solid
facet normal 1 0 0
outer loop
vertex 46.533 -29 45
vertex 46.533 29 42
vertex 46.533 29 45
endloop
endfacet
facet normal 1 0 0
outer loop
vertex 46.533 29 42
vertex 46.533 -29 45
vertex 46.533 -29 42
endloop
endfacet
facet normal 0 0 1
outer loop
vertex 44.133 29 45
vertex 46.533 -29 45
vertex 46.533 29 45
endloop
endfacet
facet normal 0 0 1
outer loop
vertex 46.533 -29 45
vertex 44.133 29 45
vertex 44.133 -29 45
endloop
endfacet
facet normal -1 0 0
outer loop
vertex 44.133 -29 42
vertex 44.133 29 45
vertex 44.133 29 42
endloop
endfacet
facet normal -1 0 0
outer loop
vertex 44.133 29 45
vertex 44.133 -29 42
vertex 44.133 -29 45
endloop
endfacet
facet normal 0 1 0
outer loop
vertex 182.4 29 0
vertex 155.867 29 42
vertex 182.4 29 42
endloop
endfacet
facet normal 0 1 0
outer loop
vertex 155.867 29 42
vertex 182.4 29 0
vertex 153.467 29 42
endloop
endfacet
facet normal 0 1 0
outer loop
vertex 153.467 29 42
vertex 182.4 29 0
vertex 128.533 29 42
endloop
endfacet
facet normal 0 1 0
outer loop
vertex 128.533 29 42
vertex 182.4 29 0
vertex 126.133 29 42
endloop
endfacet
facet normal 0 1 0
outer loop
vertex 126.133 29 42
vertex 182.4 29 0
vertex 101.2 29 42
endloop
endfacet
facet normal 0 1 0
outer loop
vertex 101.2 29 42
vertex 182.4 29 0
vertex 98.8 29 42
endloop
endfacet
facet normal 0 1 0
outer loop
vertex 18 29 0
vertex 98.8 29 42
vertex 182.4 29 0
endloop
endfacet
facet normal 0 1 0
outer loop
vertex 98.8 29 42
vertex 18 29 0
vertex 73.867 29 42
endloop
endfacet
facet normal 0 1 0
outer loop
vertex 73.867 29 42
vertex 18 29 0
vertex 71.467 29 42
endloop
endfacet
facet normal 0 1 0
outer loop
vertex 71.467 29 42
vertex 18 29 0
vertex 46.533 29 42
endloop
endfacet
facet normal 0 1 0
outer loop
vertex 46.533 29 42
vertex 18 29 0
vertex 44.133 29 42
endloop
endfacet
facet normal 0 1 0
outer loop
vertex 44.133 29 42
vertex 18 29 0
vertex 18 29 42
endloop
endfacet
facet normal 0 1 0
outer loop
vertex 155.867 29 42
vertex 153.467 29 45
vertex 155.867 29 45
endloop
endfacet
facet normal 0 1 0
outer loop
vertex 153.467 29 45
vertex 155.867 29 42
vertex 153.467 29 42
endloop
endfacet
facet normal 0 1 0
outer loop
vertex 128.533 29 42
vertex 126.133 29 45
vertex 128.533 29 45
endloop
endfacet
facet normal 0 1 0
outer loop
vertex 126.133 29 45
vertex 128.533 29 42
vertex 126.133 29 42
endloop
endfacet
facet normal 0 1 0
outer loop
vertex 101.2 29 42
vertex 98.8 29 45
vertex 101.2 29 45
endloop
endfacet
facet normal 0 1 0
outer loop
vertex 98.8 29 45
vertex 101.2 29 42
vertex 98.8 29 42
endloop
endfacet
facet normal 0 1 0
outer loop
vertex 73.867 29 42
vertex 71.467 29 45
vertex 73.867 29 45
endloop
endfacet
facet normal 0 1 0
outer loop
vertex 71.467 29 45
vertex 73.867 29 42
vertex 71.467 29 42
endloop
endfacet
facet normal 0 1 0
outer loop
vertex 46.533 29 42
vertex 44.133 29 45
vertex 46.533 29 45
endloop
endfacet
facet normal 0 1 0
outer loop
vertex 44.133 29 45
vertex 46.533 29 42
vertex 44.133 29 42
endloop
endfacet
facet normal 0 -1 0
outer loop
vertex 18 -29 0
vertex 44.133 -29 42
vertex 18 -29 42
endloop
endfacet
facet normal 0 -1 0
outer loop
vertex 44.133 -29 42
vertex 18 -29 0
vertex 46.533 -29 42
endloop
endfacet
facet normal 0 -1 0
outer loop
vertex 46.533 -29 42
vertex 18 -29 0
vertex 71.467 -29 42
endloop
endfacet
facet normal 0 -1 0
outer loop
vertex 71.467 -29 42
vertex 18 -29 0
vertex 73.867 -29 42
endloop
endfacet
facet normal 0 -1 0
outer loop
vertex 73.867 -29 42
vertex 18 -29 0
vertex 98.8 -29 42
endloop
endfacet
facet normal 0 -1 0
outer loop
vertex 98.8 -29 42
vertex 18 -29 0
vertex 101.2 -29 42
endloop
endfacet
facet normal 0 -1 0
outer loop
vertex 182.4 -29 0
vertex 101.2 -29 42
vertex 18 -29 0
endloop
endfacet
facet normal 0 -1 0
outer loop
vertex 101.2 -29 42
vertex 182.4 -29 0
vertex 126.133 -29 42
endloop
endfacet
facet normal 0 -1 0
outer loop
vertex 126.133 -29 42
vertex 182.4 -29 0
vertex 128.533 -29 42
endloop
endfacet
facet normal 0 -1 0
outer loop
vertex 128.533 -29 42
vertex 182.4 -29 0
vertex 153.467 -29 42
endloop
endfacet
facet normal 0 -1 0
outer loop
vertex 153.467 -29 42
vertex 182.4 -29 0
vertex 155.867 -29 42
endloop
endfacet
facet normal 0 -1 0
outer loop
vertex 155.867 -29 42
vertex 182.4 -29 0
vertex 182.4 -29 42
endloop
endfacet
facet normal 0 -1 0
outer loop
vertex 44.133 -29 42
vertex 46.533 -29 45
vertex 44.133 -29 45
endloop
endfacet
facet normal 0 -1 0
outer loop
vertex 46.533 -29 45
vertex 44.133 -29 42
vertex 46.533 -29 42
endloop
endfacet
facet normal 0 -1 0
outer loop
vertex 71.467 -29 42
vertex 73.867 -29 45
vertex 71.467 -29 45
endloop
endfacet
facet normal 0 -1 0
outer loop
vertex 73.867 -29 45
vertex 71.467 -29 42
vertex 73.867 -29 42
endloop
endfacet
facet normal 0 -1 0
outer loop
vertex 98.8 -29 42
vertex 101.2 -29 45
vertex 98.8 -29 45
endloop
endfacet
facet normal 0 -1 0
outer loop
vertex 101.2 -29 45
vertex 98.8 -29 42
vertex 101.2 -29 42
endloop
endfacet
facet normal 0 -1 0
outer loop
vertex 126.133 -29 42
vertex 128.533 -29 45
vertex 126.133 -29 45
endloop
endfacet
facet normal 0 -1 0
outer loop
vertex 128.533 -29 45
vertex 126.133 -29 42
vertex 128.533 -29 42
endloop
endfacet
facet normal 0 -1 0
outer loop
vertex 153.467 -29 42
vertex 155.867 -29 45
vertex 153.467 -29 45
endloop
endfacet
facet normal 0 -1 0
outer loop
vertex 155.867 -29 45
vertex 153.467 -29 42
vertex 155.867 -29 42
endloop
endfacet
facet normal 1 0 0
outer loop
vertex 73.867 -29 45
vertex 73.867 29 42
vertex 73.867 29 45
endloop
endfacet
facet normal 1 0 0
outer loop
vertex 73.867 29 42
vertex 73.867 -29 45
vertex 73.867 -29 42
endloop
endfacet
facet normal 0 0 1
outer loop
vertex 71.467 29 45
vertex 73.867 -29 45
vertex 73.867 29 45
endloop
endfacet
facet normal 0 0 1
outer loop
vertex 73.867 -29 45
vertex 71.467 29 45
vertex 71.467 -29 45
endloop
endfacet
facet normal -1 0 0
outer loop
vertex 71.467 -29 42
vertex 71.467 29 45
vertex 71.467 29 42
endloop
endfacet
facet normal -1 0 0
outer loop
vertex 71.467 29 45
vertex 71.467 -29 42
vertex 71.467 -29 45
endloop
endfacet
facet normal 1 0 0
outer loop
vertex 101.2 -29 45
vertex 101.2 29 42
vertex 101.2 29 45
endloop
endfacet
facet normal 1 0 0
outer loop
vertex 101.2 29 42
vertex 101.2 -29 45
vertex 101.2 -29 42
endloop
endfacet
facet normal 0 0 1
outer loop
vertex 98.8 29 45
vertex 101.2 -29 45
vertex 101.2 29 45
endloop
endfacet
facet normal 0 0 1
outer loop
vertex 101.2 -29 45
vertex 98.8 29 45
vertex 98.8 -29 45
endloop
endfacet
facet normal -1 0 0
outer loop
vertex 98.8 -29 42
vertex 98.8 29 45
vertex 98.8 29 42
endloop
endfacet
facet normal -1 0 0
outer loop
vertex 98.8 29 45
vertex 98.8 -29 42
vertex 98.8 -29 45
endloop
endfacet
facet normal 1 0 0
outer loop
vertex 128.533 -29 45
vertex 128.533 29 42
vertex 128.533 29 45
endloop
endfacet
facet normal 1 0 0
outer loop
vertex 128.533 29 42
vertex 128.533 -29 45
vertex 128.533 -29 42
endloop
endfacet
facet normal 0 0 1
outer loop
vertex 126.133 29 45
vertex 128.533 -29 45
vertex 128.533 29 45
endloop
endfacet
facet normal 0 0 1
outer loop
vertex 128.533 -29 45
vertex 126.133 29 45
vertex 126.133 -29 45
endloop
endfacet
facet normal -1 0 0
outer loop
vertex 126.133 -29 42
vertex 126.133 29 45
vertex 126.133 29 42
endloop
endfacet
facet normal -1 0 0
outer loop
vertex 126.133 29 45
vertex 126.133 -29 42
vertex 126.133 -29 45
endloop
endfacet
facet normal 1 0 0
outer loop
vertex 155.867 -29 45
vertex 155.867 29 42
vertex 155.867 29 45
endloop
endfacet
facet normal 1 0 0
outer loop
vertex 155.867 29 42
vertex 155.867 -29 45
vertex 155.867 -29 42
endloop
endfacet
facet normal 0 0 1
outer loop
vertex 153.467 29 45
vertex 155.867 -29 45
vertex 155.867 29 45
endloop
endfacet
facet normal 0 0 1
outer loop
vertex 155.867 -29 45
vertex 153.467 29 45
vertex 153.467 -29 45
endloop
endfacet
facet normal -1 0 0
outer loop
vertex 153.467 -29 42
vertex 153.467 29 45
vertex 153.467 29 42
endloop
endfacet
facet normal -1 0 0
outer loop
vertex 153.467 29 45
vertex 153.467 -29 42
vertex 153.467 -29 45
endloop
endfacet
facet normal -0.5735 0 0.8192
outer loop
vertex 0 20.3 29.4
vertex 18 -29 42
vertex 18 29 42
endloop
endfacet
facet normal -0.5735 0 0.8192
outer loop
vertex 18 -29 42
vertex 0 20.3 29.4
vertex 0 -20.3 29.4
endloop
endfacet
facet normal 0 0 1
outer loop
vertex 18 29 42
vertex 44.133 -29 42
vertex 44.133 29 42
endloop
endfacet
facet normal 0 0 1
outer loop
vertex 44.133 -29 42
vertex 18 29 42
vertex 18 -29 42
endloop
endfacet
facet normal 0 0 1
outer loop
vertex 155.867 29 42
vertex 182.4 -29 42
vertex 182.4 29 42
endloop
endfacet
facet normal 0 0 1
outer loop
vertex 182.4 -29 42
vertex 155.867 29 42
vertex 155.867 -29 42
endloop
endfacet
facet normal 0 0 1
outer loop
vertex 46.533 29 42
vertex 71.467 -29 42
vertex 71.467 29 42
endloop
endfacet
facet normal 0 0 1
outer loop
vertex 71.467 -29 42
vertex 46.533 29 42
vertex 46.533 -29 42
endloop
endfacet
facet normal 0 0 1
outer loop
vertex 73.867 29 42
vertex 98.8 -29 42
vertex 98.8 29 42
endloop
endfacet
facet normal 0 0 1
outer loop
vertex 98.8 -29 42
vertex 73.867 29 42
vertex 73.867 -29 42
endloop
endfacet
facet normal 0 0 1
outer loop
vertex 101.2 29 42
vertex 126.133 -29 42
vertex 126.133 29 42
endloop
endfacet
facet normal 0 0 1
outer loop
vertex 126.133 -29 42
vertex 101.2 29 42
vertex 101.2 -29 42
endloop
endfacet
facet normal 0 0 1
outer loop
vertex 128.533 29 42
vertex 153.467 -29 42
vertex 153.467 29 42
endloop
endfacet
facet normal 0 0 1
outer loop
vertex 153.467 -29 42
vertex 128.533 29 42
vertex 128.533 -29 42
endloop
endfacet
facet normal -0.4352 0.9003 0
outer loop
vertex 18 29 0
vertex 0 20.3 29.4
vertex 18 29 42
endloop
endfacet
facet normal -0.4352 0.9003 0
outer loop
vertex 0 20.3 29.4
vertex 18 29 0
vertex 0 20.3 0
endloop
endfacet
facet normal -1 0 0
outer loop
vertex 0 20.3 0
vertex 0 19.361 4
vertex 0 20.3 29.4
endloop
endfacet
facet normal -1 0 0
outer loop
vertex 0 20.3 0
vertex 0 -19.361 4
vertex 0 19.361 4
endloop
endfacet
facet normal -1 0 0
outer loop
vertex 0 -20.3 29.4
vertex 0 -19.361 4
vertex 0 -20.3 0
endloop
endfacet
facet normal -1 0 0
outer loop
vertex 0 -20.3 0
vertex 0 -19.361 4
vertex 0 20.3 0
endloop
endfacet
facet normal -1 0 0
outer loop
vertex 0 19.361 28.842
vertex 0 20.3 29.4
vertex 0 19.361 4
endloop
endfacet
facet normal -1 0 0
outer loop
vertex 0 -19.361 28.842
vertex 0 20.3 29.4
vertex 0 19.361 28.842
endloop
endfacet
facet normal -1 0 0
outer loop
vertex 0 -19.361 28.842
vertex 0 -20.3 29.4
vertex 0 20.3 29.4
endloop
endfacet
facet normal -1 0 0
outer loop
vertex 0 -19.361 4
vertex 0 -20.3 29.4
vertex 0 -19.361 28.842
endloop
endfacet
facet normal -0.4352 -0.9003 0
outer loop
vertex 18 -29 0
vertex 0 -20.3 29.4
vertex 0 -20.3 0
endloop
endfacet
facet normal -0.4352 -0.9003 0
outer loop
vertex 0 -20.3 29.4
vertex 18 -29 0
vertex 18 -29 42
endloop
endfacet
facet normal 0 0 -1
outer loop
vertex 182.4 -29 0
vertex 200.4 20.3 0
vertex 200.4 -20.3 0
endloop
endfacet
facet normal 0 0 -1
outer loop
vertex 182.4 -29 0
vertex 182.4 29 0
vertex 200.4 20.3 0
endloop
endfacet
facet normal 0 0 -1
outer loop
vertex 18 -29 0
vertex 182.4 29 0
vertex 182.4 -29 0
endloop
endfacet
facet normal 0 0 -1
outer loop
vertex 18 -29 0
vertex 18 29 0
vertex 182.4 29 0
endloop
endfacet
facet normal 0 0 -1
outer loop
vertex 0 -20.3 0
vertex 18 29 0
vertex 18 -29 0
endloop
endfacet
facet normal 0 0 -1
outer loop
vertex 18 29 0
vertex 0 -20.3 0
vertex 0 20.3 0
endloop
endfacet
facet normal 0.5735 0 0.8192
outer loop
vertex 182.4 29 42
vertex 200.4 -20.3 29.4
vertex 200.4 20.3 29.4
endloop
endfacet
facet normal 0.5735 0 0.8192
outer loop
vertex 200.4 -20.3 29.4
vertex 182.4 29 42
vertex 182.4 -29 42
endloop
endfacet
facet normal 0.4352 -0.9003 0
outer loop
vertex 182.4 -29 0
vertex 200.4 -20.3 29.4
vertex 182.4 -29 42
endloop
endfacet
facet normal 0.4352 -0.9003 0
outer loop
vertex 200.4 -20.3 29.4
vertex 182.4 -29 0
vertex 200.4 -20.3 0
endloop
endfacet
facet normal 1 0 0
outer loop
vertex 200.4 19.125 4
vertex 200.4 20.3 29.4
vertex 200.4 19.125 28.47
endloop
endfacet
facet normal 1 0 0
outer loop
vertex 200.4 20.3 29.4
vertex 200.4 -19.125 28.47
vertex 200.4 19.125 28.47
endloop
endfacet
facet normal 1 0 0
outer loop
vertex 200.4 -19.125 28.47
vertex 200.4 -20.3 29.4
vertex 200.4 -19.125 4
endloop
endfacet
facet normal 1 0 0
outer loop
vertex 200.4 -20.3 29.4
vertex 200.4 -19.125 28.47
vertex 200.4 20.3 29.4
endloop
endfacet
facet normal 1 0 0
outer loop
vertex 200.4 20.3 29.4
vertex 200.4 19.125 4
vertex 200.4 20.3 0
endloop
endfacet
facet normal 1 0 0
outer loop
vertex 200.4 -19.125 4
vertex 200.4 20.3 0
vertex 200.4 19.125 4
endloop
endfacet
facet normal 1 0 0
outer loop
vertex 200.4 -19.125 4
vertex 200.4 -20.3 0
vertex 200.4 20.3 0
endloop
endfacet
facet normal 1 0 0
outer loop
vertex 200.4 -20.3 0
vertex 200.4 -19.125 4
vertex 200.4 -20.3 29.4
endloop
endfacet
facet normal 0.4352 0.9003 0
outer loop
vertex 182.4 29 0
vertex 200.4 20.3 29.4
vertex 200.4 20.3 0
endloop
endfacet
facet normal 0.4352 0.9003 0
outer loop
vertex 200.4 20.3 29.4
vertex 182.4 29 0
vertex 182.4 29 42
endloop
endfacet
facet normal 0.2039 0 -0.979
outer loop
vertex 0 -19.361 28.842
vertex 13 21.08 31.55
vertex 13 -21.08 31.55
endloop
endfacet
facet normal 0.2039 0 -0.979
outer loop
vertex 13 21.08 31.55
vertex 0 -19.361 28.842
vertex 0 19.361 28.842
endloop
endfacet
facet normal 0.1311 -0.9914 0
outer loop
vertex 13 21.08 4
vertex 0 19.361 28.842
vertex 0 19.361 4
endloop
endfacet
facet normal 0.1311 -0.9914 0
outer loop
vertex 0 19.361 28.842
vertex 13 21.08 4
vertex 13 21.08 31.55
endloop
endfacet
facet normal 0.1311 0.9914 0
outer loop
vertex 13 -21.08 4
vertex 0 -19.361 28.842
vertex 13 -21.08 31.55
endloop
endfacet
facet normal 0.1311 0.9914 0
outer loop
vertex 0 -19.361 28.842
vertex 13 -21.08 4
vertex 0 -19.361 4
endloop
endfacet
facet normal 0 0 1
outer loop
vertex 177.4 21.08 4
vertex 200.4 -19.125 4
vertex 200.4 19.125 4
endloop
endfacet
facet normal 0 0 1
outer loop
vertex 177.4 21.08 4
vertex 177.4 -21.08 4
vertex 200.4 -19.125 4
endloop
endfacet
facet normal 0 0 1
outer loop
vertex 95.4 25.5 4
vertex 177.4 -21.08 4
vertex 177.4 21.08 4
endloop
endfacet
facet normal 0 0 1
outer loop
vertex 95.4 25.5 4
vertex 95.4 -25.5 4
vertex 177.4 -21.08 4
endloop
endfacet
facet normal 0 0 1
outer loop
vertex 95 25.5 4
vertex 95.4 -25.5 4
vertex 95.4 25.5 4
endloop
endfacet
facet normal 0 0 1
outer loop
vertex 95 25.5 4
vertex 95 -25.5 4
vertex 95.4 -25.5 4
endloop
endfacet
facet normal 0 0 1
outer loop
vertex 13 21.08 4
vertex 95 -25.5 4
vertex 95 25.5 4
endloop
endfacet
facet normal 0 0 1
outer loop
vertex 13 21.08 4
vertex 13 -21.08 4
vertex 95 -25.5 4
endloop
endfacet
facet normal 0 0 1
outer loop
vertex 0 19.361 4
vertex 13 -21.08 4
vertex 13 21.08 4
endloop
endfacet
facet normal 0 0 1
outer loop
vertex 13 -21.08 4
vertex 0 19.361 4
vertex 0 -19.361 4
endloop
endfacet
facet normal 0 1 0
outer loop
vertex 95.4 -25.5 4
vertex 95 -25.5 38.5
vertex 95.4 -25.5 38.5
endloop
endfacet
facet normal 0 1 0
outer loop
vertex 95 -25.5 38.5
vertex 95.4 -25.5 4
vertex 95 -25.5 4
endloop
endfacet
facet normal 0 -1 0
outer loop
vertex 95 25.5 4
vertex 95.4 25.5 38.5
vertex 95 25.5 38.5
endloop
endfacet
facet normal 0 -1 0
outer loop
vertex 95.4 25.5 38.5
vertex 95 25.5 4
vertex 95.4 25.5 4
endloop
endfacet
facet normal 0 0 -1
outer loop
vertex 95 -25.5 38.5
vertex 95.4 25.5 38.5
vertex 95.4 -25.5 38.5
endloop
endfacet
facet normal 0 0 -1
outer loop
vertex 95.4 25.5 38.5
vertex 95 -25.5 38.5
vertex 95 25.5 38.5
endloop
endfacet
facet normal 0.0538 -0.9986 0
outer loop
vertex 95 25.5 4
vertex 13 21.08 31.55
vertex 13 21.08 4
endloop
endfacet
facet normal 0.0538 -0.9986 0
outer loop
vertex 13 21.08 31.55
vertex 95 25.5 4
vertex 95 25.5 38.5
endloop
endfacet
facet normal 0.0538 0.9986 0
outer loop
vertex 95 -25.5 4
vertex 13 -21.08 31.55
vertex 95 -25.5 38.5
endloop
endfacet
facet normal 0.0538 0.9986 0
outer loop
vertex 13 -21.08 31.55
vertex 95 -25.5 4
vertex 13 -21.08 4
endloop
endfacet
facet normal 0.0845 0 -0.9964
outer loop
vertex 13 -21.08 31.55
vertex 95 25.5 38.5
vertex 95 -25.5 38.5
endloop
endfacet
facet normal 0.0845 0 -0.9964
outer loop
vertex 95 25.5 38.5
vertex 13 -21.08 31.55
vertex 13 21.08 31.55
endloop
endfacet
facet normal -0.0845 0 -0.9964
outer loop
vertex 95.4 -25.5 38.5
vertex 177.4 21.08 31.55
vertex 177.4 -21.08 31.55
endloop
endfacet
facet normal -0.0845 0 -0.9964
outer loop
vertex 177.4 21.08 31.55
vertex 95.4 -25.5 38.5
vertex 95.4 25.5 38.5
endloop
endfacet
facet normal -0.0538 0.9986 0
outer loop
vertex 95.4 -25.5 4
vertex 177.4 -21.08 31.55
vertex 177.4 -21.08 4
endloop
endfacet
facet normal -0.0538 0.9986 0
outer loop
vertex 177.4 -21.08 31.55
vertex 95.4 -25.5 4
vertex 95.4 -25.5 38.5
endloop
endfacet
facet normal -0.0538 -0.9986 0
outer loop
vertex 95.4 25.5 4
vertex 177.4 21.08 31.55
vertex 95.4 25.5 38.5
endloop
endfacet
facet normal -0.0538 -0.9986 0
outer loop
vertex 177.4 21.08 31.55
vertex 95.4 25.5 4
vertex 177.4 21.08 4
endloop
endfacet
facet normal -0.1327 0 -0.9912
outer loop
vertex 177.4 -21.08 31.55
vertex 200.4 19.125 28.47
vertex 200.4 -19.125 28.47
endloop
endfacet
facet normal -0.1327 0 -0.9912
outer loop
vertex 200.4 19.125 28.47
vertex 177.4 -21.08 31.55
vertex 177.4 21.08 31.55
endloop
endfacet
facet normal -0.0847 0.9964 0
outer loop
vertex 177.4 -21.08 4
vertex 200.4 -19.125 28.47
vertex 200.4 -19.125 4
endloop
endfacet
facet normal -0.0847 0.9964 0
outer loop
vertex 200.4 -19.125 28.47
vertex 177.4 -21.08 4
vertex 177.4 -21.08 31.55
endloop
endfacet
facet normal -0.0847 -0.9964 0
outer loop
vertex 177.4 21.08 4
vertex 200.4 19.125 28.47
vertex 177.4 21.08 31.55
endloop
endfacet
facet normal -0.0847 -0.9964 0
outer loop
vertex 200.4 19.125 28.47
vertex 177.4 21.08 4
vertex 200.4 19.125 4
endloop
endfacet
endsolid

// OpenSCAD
$fn = 32;

// ----------------------------------------------------------------------
// Faired channel: 200 x 58 x 42 mm, 3.5 mm walls, faired ends
// ----------------------------------------------------------------------

// --- parameters (mm) ---
length = 200;             // channel length
width = 58;               // channel width at mid length
height = 42;              // channel height at mid length
wall = 3.5;               // side wall thickness
floor_t = 4;              // floor thickness
end_w = 40.6;             // faired end width
end_h = 29.4;             // faired end height
ribs = 5;                 // stiffening ribs on the top
rib_t = 2.4;              // rib thickness
rib_h = 3;                // rib height

difference() {
  union() {
    hull() {
      translate([0, -20.3, 0]) cube([0.4, 40.6, 29.4]);
      translate([18, -29, 0]) cube([0.4, 58, 42]);
    }
    hull() {
      translate([18, -29, 0]) cube([0.4, 58, 42]);
      translate([100, -29, 0]) cube([0.4, 58, 42]);
    }
    hull() {
      translate([100, -29, 0]) cube([0.4, 58, 42]);
      translate([182, -29, 0]) cube([0.4, 58, 42]);
    }
    hull() {
      translate([182, -29, 0]) cube([0.4, 58, 42]);
      translate([200, -20.3, 0]) cube([0.4, 40.6, 29.4]);
    }
    /* stiffening ribs across the flat top, sunk 0.8 mm into it */
    for (i = [1 : ribs]) {
      translate([18 + i * (length - 2 * 18) / (ribs + 1) - rib_t / 2, -width / 2, height - 0.8]) cube([rib_t, width, rib_h + 0.8]);
    }
  }
  /* cavity, 5 mm proud of both ends so the ports are cut clean */
  hull() {
    translate([-5, -18.7, 4]) cube([0.4, 37.4, 23.8]);
    translate([13, -21.08, 4]) cube([0.4, 42.16, 27.55]);
  }
  hull() {
    translate([13, -21.08, 4]) cube([0.4, 42.16, 27.55]);
    translate([95, -25.5, 4]) cube([0.4, 51, 34.5]);
  }
  hull() {
    translate([95, -25.5, 4]) cube([0.4, 51, 34.5]);
    translate([177, -21.08, 4]) cube([0.4, 42.16, 27.55]);
  }
  hull() {
    translate([177, -21.08, 4]) cube([0.4, 42.16, 27.55]);
    translate([205, -18.7, 4]) cube([0.4, 37.4, 23.8]);
  }
}
